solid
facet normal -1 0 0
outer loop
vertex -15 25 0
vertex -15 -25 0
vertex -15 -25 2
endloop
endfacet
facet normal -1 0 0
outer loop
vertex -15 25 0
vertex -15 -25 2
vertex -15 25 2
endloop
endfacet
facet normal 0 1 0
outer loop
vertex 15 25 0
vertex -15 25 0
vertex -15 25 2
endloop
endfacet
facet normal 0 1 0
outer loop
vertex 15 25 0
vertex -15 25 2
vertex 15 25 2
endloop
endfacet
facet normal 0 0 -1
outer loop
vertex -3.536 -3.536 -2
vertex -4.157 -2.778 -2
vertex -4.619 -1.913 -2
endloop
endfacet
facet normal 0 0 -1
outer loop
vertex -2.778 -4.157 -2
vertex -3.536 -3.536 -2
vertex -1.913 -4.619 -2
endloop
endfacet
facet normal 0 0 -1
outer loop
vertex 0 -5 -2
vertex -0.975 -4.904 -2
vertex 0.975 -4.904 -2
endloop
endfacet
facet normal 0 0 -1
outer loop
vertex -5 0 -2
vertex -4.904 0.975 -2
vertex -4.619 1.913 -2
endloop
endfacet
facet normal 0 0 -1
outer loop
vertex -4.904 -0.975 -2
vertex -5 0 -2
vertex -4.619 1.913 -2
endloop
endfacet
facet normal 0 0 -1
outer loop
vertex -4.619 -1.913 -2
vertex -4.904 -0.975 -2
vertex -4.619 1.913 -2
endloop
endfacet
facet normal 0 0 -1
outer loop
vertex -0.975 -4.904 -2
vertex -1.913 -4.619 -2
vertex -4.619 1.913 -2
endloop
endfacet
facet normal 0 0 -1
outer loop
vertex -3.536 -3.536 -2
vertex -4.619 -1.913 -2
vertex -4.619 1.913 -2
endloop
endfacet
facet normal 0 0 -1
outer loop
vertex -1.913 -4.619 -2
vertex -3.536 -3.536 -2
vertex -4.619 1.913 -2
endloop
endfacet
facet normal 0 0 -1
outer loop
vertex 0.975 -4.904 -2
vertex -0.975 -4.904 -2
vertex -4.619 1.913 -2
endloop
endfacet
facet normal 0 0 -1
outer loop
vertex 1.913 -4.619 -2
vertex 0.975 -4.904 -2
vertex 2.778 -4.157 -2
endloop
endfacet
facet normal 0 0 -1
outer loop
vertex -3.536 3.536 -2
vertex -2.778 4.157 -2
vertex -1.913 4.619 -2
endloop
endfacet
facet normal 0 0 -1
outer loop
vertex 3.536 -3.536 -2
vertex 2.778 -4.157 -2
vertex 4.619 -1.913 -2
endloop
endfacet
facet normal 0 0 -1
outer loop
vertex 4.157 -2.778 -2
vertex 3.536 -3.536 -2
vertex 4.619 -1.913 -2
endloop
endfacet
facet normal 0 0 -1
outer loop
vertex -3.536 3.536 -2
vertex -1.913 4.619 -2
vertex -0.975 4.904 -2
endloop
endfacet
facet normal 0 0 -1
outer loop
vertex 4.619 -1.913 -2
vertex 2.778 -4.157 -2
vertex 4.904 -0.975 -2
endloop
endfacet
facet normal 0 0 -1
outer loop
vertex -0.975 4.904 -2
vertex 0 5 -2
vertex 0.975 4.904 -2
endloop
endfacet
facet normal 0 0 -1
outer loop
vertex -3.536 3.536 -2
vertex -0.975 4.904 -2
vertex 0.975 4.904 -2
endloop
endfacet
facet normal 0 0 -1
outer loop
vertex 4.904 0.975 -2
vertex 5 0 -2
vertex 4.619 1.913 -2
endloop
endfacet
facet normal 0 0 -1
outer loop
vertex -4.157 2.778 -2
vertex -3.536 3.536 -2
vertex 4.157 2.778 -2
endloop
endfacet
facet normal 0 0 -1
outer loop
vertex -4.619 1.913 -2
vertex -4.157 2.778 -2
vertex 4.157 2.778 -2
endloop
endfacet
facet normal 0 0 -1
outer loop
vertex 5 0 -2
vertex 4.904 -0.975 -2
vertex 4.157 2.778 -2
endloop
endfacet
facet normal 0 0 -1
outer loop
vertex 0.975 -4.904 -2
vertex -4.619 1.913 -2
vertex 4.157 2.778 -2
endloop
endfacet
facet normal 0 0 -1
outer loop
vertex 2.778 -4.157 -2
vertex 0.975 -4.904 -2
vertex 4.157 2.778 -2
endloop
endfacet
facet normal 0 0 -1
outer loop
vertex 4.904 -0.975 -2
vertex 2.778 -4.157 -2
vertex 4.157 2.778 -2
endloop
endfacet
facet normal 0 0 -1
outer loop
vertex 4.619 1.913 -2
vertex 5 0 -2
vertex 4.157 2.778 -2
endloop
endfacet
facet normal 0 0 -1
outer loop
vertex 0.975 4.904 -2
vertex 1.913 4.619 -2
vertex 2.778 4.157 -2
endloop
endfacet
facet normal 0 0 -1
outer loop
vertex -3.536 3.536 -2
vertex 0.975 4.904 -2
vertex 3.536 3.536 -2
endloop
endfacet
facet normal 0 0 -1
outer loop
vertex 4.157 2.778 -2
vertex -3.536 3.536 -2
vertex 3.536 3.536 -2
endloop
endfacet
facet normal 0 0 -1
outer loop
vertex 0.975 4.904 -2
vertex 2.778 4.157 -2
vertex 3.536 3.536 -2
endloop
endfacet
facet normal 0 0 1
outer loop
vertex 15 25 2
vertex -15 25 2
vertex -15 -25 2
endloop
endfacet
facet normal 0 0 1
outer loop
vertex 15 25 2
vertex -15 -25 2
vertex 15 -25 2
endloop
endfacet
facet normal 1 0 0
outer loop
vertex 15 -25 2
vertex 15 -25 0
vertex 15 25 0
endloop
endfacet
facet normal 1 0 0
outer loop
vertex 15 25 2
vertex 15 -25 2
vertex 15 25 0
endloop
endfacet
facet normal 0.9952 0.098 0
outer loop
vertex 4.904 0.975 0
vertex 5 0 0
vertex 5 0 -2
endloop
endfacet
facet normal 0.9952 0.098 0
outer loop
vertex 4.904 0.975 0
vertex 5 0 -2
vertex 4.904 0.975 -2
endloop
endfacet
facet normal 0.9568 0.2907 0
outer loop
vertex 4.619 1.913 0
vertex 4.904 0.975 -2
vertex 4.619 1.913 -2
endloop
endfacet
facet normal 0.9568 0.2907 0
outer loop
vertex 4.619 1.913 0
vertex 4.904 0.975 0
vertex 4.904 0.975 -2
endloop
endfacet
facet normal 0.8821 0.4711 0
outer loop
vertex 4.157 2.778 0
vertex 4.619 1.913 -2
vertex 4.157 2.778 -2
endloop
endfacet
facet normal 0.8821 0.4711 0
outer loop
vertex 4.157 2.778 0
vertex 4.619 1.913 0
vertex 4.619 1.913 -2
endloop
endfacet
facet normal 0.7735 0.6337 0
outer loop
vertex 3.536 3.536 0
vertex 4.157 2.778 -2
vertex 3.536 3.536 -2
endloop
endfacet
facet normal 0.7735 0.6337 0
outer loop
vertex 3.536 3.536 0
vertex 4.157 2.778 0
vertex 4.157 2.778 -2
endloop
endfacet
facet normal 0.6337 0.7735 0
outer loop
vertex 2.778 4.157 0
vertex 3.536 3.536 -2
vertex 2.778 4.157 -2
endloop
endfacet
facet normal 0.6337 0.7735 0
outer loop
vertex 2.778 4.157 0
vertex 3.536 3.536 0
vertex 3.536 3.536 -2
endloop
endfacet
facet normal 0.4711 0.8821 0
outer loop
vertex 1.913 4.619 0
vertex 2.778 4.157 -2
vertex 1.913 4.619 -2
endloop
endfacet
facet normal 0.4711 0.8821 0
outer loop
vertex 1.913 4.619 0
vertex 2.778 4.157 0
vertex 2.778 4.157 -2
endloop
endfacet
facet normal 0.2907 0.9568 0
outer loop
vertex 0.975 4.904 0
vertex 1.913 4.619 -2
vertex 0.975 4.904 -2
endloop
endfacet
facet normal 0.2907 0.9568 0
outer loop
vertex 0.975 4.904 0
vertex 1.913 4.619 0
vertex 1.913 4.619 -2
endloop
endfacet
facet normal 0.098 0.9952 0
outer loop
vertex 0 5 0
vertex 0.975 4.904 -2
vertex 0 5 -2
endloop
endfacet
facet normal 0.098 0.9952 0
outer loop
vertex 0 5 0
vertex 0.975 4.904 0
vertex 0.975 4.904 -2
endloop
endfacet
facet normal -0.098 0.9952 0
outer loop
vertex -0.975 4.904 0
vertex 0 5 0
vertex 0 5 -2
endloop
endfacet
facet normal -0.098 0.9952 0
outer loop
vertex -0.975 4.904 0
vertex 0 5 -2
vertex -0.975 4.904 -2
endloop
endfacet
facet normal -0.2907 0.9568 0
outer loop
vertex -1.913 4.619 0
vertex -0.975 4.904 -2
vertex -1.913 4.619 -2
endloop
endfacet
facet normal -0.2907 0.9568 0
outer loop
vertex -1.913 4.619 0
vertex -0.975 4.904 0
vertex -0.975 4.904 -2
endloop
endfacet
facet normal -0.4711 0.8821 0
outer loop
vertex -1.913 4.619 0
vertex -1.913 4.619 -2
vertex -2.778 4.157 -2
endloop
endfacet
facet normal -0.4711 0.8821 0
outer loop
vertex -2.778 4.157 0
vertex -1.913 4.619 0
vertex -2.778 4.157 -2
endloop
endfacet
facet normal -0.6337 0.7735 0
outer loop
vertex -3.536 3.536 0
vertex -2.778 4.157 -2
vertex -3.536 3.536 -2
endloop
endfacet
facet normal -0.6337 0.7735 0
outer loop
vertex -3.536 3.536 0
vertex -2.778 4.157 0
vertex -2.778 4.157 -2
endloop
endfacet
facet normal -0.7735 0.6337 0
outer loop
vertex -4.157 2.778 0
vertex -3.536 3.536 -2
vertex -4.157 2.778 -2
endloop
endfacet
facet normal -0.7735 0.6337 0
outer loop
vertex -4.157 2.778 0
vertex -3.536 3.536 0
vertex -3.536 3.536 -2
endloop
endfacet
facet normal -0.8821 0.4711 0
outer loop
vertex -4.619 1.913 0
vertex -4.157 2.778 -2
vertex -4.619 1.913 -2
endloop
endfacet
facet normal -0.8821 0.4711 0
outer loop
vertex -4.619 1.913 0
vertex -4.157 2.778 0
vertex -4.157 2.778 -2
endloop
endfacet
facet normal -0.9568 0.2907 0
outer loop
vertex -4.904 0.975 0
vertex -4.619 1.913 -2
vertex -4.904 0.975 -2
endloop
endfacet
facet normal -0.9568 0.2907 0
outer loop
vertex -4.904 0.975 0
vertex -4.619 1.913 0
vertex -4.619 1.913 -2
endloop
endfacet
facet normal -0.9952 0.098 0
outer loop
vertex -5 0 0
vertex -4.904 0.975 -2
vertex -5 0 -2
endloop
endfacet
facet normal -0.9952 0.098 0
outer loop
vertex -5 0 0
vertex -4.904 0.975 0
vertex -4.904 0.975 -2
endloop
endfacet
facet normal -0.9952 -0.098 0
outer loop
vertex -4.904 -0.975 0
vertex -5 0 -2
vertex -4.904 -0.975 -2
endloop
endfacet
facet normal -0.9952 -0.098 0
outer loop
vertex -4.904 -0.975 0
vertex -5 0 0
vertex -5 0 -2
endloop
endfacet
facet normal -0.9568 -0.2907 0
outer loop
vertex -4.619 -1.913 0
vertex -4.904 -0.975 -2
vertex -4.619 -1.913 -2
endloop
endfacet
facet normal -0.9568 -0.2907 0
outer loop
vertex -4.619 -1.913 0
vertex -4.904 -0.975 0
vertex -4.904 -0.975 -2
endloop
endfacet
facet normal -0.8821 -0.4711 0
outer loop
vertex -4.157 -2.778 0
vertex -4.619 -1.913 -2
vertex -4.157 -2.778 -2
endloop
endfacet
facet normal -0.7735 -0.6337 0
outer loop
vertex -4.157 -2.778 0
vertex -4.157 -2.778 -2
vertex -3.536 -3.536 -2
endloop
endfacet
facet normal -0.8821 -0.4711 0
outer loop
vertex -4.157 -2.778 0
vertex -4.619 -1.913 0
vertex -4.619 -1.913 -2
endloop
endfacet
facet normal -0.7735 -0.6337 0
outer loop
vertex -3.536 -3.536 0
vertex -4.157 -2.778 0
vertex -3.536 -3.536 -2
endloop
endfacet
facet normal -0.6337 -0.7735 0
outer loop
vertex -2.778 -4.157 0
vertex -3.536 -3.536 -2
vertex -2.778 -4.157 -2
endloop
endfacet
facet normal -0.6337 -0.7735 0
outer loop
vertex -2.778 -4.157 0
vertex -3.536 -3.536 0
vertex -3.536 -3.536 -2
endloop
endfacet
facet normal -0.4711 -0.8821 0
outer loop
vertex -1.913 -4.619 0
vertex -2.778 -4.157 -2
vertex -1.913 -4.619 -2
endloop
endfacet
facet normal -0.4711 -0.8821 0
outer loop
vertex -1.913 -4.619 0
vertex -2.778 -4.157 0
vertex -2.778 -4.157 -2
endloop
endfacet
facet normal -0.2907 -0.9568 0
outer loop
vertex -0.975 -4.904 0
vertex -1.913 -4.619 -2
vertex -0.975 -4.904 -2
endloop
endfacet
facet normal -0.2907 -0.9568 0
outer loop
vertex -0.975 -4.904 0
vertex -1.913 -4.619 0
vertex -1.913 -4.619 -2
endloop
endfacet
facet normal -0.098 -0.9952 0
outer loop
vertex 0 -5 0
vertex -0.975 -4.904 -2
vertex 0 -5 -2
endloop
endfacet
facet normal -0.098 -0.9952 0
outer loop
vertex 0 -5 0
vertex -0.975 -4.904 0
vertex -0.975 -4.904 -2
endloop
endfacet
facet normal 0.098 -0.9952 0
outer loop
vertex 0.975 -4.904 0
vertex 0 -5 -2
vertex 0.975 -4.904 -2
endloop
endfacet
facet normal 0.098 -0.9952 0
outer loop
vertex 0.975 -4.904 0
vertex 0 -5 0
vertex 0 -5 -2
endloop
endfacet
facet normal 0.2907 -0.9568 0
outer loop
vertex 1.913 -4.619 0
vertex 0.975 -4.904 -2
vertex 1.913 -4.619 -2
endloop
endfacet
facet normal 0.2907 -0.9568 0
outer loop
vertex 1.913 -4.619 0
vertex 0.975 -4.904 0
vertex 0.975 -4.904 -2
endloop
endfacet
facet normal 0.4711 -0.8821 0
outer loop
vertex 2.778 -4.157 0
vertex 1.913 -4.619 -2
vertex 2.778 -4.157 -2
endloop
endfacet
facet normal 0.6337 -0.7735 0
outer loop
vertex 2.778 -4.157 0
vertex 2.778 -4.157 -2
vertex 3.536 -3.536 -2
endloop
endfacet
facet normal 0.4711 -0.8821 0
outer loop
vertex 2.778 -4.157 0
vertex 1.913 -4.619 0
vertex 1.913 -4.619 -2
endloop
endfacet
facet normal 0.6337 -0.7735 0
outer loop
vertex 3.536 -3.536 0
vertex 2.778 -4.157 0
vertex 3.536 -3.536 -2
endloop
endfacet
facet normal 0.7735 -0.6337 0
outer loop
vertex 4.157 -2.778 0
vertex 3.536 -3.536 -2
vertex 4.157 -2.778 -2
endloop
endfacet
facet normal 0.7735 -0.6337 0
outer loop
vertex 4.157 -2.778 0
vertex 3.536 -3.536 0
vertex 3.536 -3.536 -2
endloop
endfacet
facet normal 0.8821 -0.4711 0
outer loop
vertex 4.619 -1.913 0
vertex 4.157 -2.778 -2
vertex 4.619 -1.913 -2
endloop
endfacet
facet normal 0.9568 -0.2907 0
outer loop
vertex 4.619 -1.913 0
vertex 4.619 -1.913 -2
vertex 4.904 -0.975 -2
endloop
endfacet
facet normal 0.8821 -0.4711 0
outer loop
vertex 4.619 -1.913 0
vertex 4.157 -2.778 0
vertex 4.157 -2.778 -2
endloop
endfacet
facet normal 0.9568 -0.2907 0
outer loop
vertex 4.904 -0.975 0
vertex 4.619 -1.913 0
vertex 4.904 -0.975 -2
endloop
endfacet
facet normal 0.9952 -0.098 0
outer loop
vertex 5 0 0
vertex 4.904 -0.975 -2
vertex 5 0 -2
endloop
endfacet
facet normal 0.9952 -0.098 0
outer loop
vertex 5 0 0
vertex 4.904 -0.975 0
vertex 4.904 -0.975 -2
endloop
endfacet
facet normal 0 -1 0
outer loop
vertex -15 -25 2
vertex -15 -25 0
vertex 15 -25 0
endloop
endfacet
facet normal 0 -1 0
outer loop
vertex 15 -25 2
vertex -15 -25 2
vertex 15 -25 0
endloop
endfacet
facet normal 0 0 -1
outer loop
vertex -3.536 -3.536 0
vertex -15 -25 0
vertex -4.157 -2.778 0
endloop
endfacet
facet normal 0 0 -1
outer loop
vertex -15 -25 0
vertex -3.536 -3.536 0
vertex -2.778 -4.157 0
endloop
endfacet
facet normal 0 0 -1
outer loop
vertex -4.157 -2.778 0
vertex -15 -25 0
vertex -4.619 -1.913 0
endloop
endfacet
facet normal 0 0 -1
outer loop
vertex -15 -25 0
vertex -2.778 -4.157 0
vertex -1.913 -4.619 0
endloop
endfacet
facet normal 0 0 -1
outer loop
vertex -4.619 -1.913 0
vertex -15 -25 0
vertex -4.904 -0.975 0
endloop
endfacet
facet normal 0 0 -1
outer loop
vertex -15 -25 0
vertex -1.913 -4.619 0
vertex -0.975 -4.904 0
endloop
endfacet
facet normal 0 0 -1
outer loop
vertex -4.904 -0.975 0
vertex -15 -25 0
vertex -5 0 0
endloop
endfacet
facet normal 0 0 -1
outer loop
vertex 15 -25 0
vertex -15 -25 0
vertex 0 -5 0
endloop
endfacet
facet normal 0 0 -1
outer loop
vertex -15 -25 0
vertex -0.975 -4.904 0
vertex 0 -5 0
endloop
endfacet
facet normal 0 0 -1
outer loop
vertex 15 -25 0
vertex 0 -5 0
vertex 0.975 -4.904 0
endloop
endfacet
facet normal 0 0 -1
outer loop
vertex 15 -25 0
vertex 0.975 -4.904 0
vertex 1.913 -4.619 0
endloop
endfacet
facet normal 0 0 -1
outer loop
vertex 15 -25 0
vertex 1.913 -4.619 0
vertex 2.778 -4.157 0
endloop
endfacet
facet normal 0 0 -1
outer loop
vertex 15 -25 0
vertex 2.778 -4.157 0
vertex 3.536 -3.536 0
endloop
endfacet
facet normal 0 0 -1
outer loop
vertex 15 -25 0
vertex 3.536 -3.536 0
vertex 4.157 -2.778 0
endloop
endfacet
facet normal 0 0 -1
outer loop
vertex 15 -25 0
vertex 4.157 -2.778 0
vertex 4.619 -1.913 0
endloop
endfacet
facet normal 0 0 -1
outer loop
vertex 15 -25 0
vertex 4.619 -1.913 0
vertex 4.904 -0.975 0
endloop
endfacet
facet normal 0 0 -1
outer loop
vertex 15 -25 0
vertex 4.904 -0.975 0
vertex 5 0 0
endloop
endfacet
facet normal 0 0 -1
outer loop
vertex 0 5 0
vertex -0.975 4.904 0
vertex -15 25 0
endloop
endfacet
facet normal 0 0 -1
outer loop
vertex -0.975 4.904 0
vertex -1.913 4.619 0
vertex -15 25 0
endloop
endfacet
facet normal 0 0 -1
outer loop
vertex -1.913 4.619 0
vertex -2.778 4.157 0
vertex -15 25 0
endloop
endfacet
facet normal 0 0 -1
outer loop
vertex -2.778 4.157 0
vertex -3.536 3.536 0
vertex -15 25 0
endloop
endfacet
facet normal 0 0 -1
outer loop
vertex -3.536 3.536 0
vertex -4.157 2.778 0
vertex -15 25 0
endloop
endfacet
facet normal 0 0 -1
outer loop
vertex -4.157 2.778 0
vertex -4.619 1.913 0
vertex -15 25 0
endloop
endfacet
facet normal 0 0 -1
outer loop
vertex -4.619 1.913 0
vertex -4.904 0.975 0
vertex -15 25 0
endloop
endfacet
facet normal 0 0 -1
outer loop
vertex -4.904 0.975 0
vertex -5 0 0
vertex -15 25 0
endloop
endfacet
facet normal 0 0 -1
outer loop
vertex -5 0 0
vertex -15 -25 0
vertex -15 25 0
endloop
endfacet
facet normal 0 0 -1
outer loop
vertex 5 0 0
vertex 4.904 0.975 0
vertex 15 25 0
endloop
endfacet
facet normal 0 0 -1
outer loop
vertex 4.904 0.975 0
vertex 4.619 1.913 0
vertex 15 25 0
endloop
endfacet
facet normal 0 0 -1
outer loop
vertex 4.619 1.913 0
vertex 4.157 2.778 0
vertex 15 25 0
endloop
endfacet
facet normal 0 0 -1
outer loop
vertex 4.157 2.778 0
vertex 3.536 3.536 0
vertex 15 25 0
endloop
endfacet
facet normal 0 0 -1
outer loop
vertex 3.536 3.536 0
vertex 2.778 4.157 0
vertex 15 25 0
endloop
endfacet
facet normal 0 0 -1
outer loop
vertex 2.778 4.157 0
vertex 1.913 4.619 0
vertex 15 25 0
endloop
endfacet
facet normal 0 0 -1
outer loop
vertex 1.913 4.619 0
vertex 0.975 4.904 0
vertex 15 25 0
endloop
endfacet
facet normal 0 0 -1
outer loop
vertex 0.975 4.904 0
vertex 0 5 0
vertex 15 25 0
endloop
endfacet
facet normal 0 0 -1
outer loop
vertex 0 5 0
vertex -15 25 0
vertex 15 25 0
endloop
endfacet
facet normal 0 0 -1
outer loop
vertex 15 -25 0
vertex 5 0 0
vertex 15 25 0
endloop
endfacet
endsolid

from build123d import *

# Parameters (mm, degrees)
F0_W     = 30
F0_H     = 50
F0_R     = 5
F1_DEPTH = 2
F2_DEPTH = 2


with BuildPart() as f1:
    # F0 (on Top) → F1 (new body)
    with BuildSketch(Plane.XY):
        Rectangle(F0_W, F0_H)
        Circle(F0_R, mode=Mode.SUBTRACT)
        Circle(F0_R)
    extrude(amount=F1_DEPTH)

    # F0 (on Top) → F2 (join)
    with BuildSketch(Plane.XY):
        Circle(F0_R)
    extrude(amount=-F2_DEPTH)


solid = f1.part
